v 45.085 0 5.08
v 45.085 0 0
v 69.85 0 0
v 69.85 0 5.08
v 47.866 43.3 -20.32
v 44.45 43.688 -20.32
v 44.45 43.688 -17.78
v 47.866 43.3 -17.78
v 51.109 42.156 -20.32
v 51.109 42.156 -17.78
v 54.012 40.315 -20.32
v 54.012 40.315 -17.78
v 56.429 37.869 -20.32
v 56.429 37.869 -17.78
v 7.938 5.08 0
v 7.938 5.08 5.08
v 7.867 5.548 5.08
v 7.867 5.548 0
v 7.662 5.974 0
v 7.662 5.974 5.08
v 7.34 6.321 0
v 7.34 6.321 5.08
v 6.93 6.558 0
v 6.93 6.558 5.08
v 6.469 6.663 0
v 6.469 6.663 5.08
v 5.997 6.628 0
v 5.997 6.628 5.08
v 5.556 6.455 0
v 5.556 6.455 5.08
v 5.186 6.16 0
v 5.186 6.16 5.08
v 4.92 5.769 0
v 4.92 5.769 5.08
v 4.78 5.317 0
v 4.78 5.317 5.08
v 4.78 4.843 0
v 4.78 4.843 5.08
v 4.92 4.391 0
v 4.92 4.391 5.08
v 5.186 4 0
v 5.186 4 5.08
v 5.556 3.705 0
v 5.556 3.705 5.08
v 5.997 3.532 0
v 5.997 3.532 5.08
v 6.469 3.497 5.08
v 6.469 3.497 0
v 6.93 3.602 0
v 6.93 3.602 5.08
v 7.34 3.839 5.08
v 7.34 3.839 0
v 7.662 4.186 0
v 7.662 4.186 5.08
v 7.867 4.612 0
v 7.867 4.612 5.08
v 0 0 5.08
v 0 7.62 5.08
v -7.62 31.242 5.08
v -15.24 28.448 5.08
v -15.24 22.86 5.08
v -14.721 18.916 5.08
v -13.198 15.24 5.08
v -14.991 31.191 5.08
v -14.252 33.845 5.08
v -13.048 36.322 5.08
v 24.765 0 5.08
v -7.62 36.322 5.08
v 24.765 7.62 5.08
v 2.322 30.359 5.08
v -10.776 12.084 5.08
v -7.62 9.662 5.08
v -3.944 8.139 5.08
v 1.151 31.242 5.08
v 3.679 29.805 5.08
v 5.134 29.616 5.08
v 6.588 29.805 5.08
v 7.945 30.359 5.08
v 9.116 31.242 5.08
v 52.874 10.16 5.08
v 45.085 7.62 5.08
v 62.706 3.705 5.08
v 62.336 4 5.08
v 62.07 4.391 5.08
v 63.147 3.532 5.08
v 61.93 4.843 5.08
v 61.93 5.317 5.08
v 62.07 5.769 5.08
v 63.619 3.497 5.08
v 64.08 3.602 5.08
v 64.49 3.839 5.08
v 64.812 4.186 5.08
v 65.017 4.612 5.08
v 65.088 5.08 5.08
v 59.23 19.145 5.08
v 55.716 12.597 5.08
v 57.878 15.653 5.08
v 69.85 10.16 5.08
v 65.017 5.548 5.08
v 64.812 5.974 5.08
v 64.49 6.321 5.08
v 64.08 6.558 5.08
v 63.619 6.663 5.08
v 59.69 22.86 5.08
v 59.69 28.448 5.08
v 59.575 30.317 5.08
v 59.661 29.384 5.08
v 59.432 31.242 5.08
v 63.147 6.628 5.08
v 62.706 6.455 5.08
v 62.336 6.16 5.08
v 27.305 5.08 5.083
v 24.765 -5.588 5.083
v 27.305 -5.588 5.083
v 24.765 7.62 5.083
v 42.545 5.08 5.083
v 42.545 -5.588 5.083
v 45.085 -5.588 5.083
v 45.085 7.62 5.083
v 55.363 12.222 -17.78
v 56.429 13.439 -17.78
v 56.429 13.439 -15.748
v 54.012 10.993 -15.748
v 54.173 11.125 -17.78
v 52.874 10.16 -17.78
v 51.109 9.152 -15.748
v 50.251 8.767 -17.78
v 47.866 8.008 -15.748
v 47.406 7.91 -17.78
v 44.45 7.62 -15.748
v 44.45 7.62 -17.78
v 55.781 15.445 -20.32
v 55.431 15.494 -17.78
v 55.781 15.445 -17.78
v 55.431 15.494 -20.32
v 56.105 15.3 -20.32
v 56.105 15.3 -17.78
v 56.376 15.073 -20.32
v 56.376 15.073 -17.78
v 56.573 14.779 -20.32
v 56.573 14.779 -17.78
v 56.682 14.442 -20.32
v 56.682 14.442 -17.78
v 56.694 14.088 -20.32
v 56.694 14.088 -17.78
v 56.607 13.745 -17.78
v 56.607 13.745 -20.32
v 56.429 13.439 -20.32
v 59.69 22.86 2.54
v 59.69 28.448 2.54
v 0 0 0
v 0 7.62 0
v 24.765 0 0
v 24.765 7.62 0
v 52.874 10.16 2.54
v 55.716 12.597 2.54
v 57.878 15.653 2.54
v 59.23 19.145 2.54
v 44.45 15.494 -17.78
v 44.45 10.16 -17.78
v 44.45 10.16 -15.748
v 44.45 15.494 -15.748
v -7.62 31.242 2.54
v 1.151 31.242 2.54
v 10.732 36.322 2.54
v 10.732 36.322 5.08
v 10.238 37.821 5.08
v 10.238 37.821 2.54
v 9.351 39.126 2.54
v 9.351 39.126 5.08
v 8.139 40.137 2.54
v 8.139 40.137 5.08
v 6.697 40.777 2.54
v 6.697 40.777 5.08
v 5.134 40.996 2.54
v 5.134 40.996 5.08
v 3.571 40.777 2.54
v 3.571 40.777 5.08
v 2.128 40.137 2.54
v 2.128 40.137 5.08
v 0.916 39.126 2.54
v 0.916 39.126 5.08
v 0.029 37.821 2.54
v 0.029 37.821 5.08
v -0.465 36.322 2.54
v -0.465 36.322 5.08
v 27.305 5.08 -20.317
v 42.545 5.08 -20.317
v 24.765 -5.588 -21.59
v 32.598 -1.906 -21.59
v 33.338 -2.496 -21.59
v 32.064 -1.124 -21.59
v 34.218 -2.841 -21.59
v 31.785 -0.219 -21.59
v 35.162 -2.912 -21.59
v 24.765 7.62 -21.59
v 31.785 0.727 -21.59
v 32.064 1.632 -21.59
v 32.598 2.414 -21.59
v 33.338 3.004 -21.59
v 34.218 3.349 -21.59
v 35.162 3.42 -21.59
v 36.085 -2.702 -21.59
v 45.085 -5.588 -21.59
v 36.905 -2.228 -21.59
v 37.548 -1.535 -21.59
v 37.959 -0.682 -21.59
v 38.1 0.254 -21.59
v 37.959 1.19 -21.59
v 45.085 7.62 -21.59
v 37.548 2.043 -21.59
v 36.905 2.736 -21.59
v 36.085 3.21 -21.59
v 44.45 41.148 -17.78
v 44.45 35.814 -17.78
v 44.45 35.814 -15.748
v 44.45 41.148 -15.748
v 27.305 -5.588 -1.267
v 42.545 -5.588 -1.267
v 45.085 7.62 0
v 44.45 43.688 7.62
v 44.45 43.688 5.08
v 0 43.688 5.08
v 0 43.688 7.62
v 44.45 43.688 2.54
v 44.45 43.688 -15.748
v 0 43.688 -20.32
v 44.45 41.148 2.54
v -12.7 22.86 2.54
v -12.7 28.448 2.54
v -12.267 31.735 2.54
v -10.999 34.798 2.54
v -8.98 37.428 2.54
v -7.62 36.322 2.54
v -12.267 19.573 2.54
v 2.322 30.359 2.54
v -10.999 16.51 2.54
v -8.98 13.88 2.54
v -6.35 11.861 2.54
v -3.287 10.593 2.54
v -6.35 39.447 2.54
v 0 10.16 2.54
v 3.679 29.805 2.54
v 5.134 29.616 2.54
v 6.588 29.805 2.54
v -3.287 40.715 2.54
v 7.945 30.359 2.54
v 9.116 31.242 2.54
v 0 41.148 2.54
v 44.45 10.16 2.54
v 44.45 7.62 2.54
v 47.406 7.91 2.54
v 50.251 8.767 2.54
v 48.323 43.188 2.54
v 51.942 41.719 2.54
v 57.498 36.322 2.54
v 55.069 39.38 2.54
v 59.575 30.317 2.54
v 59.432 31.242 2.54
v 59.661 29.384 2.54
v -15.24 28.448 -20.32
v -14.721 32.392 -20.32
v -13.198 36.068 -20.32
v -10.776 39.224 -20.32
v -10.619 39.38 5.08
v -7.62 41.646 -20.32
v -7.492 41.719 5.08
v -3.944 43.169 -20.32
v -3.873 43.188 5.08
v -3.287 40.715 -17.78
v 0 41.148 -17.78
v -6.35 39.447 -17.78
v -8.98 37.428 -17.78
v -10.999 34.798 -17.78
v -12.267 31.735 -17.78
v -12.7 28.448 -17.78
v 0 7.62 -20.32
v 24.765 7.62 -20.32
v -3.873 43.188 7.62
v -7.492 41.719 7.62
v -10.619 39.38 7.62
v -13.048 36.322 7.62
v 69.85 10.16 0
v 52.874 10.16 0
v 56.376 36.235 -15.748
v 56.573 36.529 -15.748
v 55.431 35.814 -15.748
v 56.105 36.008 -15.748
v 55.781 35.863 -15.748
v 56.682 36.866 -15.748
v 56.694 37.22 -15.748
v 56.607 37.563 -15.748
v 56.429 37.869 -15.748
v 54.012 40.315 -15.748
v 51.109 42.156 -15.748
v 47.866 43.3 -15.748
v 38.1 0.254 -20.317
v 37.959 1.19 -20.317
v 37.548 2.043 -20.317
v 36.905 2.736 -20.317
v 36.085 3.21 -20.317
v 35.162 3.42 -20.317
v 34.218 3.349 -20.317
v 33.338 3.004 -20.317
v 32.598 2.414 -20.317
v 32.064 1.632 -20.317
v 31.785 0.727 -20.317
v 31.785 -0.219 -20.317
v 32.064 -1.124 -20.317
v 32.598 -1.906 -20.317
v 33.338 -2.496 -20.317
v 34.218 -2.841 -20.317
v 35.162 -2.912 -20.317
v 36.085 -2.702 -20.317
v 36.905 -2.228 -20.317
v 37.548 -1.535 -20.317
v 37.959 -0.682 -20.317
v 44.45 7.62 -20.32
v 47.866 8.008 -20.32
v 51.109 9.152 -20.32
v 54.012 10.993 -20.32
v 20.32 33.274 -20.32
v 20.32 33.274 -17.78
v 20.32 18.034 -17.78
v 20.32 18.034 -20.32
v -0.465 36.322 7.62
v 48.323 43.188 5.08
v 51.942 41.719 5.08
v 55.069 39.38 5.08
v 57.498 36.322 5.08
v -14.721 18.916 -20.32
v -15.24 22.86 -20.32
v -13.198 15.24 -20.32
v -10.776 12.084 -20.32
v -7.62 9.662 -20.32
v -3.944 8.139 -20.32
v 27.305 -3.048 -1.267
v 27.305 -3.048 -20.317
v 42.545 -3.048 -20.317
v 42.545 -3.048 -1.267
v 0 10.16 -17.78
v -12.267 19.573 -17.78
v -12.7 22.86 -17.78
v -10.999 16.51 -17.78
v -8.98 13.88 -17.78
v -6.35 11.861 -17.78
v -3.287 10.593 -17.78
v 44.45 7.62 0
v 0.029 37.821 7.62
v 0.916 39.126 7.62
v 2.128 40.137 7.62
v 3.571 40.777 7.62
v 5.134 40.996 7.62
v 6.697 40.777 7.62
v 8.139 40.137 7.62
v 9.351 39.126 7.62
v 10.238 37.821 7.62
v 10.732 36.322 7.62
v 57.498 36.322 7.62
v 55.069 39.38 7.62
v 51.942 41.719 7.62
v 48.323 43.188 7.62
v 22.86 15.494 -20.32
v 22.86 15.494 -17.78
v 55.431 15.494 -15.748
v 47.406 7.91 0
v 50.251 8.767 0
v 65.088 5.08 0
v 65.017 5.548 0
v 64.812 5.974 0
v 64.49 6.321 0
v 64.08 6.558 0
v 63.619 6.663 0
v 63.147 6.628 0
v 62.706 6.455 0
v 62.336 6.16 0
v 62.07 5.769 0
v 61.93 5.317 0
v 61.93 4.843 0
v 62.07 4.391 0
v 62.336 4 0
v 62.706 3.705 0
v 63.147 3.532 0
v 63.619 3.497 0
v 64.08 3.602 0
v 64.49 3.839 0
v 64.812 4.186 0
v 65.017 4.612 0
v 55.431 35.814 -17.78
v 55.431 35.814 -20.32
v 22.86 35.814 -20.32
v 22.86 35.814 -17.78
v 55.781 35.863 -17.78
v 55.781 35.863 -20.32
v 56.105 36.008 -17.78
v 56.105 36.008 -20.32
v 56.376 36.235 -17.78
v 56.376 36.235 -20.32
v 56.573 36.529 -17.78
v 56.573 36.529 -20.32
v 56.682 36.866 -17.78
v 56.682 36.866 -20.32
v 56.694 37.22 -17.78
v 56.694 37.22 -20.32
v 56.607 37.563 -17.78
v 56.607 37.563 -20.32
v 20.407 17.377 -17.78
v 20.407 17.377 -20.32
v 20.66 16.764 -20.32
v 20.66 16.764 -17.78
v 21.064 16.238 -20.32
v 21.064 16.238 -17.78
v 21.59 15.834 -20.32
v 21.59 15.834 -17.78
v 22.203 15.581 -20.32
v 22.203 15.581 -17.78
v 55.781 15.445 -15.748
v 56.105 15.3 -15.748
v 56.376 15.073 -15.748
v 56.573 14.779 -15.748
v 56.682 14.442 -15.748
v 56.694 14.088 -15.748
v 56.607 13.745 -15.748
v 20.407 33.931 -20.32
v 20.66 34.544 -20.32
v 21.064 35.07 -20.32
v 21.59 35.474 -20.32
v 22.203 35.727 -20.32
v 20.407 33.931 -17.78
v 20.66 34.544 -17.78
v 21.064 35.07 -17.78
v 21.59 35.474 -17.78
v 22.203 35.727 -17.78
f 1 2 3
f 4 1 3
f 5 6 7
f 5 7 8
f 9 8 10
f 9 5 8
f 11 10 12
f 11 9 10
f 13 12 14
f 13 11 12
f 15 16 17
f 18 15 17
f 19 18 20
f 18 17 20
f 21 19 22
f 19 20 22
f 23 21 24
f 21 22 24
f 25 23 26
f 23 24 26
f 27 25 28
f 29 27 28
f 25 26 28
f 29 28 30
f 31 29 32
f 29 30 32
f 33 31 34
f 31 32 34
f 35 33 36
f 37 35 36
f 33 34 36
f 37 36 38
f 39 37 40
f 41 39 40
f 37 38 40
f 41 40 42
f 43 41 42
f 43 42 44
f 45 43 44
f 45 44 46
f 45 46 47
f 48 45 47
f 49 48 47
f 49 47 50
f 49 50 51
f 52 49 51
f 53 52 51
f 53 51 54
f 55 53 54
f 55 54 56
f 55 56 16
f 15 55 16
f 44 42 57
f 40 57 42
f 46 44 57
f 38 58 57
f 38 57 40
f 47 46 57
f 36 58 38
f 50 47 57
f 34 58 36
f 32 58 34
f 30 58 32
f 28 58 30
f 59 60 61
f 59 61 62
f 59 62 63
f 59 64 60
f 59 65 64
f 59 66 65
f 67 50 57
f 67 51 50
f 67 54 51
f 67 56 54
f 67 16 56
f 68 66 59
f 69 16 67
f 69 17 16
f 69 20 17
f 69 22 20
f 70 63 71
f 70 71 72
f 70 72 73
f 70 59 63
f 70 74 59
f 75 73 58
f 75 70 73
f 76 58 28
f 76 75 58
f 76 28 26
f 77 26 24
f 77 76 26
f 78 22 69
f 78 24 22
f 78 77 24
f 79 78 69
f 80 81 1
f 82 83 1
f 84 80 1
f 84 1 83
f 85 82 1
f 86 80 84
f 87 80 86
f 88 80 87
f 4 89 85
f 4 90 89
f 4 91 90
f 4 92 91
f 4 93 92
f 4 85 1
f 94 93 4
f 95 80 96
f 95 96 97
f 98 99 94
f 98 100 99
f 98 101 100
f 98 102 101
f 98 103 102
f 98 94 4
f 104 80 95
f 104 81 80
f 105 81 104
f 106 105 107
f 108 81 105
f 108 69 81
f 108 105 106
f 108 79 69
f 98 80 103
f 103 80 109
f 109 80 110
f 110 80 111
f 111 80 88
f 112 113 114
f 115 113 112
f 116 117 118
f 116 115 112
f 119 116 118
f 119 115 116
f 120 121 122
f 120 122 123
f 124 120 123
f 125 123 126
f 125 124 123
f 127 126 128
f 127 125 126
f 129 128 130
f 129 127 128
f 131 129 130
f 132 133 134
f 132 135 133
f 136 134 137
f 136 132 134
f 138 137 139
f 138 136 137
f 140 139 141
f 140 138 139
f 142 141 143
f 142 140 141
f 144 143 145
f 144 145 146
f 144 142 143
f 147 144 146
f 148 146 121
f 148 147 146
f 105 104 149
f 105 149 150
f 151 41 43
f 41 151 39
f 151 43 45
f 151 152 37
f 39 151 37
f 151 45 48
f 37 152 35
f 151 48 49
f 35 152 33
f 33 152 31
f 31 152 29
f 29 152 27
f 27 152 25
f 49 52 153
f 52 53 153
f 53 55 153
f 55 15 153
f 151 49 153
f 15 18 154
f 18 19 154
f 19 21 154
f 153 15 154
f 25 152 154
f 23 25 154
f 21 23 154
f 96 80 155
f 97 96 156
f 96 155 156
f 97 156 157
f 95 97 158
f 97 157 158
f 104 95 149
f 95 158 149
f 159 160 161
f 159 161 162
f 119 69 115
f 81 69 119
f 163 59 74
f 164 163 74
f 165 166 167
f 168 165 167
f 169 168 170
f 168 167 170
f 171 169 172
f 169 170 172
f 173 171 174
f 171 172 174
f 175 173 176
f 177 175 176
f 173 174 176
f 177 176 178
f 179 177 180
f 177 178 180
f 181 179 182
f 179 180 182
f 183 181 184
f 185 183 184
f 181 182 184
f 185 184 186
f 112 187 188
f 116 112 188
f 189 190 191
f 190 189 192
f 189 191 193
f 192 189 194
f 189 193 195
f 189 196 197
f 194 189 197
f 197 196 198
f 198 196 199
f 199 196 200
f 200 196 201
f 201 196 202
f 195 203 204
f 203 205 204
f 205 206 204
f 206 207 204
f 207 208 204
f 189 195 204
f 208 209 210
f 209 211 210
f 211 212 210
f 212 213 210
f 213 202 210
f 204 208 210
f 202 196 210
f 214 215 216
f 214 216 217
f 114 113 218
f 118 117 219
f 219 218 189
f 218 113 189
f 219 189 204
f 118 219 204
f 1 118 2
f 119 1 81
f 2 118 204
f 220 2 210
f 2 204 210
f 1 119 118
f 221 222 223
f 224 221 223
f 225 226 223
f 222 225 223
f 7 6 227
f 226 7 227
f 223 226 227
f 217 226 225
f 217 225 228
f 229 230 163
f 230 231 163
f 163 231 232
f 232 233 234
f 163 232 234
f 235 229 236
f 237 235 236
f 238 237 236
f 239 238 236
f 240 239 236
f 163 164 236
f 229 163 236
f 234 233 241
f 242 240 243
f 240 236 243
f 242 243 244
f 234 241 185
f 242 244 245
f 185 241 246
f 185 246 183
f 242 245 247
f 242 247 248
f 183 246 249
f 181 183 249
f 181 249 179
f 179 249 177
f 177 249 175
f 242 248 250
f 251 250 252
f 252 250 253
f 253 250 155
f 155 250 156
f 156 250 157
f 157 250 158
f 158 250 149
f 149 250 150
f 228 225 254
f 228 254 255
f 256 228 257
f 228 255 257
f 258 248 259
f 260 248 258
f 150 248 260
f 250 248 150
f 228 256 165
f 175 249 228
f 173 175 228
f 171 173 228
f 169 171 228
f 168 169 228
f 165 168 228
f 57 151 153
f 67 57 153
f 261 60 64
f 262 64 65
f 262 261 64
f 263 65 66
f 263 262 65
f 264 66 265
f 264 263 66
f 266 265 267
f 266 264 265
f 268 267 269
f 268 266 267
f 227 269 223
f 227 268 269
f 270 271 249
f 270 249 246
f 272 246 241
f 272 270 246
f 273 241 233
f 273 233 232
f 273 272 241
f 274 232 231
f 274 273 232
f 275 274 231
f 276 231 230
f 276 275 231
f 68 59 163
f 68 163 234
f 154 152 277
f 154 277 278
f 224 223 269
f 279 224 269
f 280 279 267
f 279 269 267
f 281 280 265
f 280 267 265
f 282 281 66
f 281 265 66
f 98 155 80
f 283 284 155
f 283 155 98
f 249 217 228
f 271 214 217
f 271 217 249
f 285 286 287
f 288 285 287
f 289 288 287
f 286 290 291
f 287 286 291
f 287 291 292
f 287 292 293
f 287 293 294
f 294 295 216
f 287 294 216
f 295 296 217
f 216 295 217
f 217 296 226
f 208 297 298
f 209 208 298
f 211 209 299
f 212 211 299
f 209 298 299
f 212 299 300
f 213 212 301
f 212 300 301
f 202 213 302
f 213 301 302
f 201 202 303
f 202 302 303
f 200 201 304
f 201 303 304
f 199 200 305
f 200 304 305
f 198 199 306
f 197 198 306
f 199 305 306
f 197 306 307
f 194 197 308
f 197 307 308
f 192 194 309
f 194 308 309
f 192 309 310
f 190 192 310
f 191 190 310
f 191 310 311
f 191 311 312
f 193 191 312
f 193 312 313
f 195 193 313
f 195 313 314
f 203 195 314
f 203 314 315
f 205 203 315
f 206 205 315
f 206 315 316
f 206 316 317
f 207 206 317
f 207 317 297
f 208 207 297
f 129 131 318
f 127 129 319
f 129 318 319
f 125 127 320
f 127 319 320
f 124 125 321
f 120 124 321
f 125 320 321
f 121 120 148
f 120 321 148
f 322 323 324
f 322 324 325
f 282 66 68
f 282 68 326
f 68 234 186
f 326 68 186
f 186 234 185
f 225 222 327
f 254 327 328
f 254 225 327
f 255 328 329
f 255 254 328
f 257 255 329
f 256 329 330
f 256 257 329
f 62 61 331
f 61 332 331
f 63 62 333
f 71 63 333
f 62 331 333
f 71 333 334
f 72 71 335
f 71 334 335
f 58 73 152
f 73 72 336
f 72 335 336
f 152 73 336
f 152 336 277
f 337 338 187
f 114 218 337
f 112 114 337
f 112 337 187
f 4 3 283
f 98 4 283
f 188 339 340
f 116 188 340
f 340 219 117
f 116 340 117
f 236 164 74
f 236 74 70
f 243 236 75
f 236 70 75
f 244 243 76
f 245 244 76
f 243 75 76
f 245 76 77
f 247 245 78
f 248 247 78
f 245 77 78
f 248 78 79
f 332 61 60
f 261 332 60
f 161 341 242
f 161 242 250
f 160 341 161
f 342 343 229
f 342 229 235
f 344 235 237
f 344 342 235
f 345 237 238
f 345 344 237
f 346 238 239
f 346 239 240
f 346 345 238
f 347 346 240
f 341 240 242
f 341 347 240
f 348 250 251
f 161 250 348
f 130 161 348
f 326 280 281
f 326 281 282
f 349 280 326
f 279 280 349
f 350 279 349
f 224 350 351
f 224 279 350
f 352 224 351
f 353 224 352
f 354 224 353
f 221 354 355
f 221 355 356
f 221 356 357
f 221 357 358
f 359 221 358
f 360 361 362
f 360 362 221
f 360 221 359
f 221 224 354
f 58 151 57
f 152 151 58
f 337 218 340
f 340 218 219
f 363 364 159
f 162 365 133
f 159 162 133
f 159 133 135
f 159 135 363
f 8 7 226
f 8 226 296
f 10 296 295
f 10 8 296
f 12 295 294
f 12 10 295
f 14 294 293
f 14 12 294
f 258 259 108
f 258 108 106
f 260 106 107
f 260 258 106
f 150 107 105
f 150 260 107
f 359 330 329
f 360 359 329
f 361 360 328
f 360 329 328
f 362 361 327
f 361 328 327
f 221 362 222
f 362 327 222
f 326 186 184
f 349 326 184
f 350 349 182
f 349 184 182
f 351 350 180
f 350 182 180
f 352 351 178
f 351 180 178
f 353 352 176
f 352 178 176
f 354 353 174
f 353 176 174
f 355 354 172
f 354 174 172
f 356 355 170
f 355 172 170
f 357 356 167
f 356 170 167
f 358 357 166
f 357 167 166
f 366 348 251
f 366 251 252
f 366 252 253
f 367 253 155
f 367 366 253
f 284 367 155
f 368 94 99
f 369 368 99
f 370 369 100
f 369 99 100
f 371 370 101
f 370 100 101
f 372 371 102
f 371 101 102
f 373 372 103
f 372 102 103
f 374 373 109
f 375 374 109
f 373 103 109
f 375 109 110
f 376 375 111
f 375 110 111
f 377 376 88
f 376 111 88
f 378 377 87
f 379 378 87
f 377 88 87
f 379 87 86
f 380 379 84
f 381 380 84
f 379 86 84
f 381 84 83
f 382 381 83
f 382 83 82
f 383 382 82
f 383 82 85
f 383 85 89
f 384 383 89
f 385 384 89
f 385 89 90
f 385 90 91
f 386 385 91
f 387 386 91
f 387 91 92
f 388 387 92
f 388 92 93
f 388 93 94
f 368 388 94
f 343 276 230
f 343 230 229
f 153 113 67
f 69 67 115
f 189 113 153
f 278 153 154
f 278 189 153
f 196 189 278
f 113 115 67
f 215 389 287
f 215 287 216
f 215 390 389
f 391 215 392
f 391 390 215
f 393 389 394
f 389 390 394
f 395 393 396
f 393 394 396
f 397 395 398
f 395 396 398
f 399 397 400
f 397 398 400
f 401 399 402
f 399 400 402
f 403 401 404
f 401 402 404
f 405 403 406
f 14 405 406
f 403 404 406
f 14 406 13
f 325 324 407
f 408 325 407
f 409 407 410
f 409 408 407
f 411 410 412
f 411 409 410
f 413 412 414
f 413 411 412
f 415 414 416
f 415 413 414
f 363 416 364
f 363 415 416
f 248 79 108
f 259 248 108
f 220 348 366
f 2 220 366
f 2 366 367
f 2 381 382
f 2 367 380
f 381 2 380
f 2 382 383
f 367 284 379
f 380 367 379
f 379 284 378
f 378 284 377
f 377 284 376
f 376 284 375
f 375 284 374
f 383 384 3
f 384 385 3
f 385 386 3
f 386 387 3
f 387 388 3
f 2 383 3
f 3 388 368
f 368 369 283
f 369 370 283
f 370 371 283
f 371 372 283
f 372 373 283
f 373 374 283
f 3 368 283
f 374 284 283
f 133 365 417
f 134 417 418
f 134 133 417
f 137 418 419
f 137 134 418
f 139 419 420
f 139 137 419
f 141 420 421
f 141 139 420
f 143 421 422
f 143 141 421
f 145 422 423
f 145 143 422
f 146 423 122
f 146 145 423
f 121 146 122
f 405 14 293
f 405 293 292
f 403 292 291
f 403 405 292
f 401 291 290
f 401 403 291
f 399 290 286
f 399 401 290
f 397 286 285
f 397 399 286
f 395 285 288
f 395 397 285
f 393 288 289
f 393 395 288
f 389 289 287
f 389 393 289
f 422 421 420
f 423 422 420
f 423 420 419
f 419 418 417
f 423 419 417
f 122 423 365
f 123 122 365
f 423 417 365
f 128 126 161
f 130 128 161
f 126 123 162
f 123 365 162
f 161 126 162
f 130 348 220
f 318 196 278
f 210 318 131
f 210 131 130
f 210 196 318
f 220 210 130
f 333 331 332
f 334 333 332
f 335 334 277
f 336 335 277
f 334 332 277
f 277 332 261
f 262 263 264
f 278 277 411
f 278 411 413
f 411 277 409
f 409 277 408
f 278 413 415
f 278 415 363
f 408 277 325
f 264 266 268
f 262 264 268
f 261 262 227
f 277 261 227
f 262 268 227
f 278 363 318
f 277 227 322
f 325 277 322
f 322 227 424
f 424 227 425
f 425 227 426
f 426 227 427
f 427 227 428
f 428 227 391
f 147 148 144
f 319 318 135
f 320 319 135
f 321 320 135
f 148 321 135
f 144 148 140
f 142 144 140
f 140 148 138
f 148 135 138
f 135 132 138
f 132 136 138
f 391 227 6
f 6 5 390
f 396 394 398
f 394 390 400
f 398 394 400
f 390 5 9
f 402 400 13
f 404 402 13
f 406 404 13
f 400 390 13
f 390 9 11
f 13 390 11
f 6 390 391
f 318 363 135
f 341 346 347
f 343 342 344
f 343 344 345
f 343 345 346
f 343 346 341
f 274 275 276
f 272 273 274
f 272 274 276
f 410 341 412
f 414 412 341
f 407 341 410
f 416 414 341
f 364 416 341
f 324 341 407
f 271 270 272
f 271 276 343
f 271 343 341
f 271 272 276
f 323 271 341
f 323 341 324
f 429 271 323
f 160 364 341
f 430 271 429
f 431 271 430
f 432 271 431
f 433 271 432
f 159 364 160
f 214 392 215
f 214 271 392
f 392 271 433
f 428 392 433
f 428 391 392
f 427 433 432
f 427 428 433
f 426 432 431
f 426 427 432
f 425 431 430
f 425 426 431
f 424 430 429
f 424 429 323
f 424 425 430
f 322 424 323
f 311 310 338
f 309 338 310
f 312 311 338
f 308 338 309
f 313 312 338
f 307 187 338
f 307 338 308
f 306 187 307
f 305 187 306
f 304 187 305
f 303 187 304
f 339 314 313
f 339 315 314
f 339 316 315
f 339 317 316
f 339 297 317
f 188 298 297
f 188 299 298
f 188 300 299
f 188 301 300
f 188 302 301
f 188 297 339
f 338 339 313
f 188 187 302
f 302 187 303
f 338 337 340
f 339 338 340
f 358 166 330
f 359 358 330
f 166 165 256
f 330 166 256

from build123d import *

# Parameters (mm, degrees)
BOSS_EXTRUDE1_OUTLINE_W  = 69.85
BOSS_EXTRUDE1_OUTLINE_H  = 10.16
BOSS_EXTRUDE1_DEPTH      = 5.08
SKETCH2_W                = 74.93
SKETCH2_H                = 36.068
BOSS_EXTRUDE2_DEPTH      = 25.4
FILLET1_R                = 15.24
SHELL5_START             = -17.78
SHELL5_DEPTH             = 20.32
SKETCH8_W                = 5.08
SKETCH8_H                = 20.32
CUT_EXTRUDE1_DEPTH       = 39.37
FILLET2_R                = 2.54
FILLET3_R                = 1.27
BOSS_EXTRUDE4_DEPTH      = 0.00254
BOSS_EXTRUDE4_DEPTH_BACK = 26.67
SKETCH4_W                = 20.32
SKETCH4_H                = 13.208
SKETCH9_R                = 3.175
CUT_EXTRUDE2_DEPTH       = 87.597276135
SKETCH10_R               = 5.690074484
CUT_EXTRUDE3_DEPTH       = 6.35
SKETCH11_R               = 1.5875
CUT_EXTRUDE4_DEPTH       = 7.62
SKETCH12_W               = 76.2
SKETCH12_H               = 5.08
CUT_EXTRUDE5_DEPTH       = 2.54
BOSS_EXTRUDE5_DEPTH      = 2.032
SKETCH14_W               = 15.24
SKETCH14_H               = 6.35
CUT_EXTRUDE6_DEPTH       = 2.54
SKETCH16_W               = 15.24
SKETCH16_H               = 8.128
CUT_EXTRUDE8_DEPTH       = 25.4
BOSS_EXTRUDE6_DEPTH      = 2.54


# Read off the part's stored shape, not the designer's step: Boss-Extrude1, Shell5
with BuildPart() as part:
    # Boss-Extrude1 outline → Boss-Extrude1 (new body)
    with BuildSketch(Plane.XY):
        with Locations((34.925, 5.08)):
            Rectangle(BOSS_EXTRUDE1_OUTLINE_W, BOSS_EXTRUDE1_OUTLINE_H)
    extrude(amount=BOSS_EXTRUDE1_DEPTH)

    # Sketch2 → Boss-Extrude2 (add)
    with BuildSketch(Plane.XY.offset(5.08)):
        with Locations((22.225, 25.654)):
            Rectangle(SKETCH2_W, SKETCH2_H)
    extrude(amount=-BOSS_EXTRUDE2_DEPTH)

    # Fillet1
    fillet1_edges = [part.edges().sort_by_distance(p)[0] for p in [
        (59.69, 7.62, -10.16),
        (59.69, 43.688, -7.62),
        (-15.24, 7.62, -7.62),
        (-15.24, 43.688, -7.62),
    ]]
    fillet(fillet1_edges, radius=FILLET1_R)

    # Shell5 outline → Shell5 (cut)
    with BuildSketch(Plane.XY.offset(SHELL5_START)):
        with BuildLine():
            ThreePointArc((-12.7, 22.86), (-8.980256121, 13.879743879), (0, 10.16))
            Line((0, 10.16), (44.45, 10.16))
            Line((44.45, 10.16), (44.45, 7.62))
            ThreePointArc((44.45, 7.62), (48.849409051, 8.268810878), (52.874226968, 10.16))
            ThreePointArc((52.874226968, 10.16), (57.878380747, 15.6533232), (59.69, 22.86))
            Line((59.69, 22.86), (59.69, 28.448))
            ThreePointArc((59.69, 28.448), (55.226307345, 39.224307345), (44.45, 43.688))
            Line((44.45, 43.688), (44.45, 41.148))
            Line((44.45, 41.148), (0, 41.148))
            ThreePointArc((0, 41.148), (-8.980256121, 37.428256121), (-12.7, 28.448))
            Line((-12.7, 28.448), (-12.7, 22.86))
        make_face()
    extrude(amount=SHELL5_DEPTH, mode=Mode.SUBTRACT)

    # Sketch8 → Cut-Extrude1 (cut)
    with BuildSketch(Plane(origin=(59.69, 0, 0), x_dir=(0, 0, -1), z_dir=(1, 0, 0))):
        with Locations((20.32, 25.654)):
            Rectangle(SKETCH8_W, SKETCH8_H)
    extrude(amount=-CUT_EXTRUDE1_DEPTH, mode=Mode.SUBTRACT)

    # Fillet2
    fillet2_edges = [part.edges().sort_by_distance(p)[0] for p in [
        (20.32, 15.494, -19.05),
        (20.32, 35.814, -19.05),
    ]]
    fillet(fillet2_edges, radius=FILLET2_R)

    # Fillet3
    fillet3_edges = [part.edges().sort_by_distance(p)[0] for p in [
        (57.791650722, 35.814, -19.05),
        (57.791650722, 15.494, -19.05),
    ]]
    fillet(fillet3_edges, radius=FILLET3_R)

    # Sketch4 → Boss-Extrude4 (add, two sides: drawn at the far end of the back side and taken through both)
    with BuildSketch(Plane.XY.offset(5.08).offset(-BOSS_EXTRUDE4_DEPTH_BACK)):
        with Locations((34.925, 1.016)):
            Rectangle(SKETCH4_W, SKETCH4_H)
    extrude(amount=BOSS_EXTRUDE4_DEPTH + BOSS_EXTRUDE4_DEPTH_BACK)

    # Sketch9 → Cut-Extrude2 (cut, through all)
    with BuildSketch(Plane.XY.offset(5.08254)):
        with Locations((34.925, 0.254)):
            Circle(SKETCH9_R)
    extrude(amount=-CUT_EXTRUDE2_DEPTH, mode=Mode.SUBTRACT)

    # Sketch10 → Cut-Extrude3 (cut)
    with BuildSketch(Plane.XY.offset(5.08)):
        with Locations((5.133620521, 35.306)):
            Circle(SKETCH10_R)
    extrude(amount=-CUT_EXTRUDE3_DEPTH, mode=Mode.SUBTRACT)

    # Sketch11 → Cut-Extrude4 (cut)
    with BuildSketch(Plane.XY.offset(5.08)):
        with Locations((6.35, 5.08)):
            Circle(SKETCH11_R)
        with Locations((63.5, 5.08)):
            Circle(SKETCH11_R)
    extrude(amount=-CUT_EXTRUDE4_DEPTH, mode=Mode.SUBTRACT)

    # Sketch12 → Cut-Extrude5 (cut)
    with BuildSketch(Plane.XY.offset(5.08)):
        with Locations((30.48, 33.782)):
            Rectangle(SKETCH12_W, SKETCH12_H)
    extrude(amount=-CUT_EXTRUDE5_DEPTH, mode=Mode.SUBTRACT)

    # Sketch13 → Boss-Extrude5 (add)
    with BuildSketch(Plane.XY.offset(-17.78)):
        with BuildLine():
            Line((44.45, 41.148), (44.45, 43.688))
            ThreePointArc((44.45, 43.688), (51.108835279, 42.156300869), (56.429175518, 37.869090909))
            ThreePointArc((56.429175518, 37.869090909), (56.573269297, 36.52909706), (55.430910891, 35.814))
            Line((55.430910891, 35.814), (44.45, 35.814))
            Line((44.45, 35.814), (44.45, 41.148))
        make_face()
        with BuildLine():
            Line((44.45, 7.62), (44.45, 15.494))
            Line((44.45, 15.494), (55.430910891, 15.494))
            ThreePointArc((55.430910891, 15.494), (56.573269297, 14.77890294), (56.429175518, 13.438909091))
            ThreePointArc((56.429175518, 13.438909091), (51.108835279, 9.151699131), (44.45, 7.62))
        make_face()
    extrude(amount=BOSS_EXTRUDE5_DEPTH)

    # Sketch14 → Cut-Extrude6 (cut)
    with BuildSketch(Plane.XZ.offset(5.588)):
        with Locations((34.925, 1.90754)):
            Rectangle(SKETCH14_W, SKETCH14_H)
    extrude(amount=-CUT_EXTRUDE6_DEPTH, mode=Mode.SUBTRACT)

    # Sketch16 → Cut-Extrude8 (cut)
    with BuildSketch(Plane.XY.offset(5.08254)):
        with Locations((34.925, 1.016)):
            Rectangle(SKETCH16_W, SKETCH16_H)
    extrude(amount=-CUT_EXTRUDE8_DEPTH, mode=Mode.SUBTRACT)

    # Sketch17 → Boss-Extrude6 (add)
    with BuildSketch(Plane.XY.offset(5.08)):
        with BuildLine():
            Line((44.45, 43.688), (0, 43.688))
            ThreePointArc((0, 43.688), (-7.491923652, 41.719348085), (-13.048284332, 36.322))
            Line((-13.048284332, 36.322), (-7.62, 36.322))
            Line((-7.62, 36.322), (-0.465012494, 36.322))
            ThreePointArc((-0.465012494, 36.322), (5.133620521, 40.996074484), (10.732253536, 36.322))
            Line((10.732253536, 36.322), (57.498284332, 36.322))
            ThreePointArc((57.498284332, 36.322), (51.941923652, 41.719348085), (44.45, 43.688))
        make_face()
    extrude(amount=BOSS_EXTRUDE6_DEPTH)


solid = part.part
